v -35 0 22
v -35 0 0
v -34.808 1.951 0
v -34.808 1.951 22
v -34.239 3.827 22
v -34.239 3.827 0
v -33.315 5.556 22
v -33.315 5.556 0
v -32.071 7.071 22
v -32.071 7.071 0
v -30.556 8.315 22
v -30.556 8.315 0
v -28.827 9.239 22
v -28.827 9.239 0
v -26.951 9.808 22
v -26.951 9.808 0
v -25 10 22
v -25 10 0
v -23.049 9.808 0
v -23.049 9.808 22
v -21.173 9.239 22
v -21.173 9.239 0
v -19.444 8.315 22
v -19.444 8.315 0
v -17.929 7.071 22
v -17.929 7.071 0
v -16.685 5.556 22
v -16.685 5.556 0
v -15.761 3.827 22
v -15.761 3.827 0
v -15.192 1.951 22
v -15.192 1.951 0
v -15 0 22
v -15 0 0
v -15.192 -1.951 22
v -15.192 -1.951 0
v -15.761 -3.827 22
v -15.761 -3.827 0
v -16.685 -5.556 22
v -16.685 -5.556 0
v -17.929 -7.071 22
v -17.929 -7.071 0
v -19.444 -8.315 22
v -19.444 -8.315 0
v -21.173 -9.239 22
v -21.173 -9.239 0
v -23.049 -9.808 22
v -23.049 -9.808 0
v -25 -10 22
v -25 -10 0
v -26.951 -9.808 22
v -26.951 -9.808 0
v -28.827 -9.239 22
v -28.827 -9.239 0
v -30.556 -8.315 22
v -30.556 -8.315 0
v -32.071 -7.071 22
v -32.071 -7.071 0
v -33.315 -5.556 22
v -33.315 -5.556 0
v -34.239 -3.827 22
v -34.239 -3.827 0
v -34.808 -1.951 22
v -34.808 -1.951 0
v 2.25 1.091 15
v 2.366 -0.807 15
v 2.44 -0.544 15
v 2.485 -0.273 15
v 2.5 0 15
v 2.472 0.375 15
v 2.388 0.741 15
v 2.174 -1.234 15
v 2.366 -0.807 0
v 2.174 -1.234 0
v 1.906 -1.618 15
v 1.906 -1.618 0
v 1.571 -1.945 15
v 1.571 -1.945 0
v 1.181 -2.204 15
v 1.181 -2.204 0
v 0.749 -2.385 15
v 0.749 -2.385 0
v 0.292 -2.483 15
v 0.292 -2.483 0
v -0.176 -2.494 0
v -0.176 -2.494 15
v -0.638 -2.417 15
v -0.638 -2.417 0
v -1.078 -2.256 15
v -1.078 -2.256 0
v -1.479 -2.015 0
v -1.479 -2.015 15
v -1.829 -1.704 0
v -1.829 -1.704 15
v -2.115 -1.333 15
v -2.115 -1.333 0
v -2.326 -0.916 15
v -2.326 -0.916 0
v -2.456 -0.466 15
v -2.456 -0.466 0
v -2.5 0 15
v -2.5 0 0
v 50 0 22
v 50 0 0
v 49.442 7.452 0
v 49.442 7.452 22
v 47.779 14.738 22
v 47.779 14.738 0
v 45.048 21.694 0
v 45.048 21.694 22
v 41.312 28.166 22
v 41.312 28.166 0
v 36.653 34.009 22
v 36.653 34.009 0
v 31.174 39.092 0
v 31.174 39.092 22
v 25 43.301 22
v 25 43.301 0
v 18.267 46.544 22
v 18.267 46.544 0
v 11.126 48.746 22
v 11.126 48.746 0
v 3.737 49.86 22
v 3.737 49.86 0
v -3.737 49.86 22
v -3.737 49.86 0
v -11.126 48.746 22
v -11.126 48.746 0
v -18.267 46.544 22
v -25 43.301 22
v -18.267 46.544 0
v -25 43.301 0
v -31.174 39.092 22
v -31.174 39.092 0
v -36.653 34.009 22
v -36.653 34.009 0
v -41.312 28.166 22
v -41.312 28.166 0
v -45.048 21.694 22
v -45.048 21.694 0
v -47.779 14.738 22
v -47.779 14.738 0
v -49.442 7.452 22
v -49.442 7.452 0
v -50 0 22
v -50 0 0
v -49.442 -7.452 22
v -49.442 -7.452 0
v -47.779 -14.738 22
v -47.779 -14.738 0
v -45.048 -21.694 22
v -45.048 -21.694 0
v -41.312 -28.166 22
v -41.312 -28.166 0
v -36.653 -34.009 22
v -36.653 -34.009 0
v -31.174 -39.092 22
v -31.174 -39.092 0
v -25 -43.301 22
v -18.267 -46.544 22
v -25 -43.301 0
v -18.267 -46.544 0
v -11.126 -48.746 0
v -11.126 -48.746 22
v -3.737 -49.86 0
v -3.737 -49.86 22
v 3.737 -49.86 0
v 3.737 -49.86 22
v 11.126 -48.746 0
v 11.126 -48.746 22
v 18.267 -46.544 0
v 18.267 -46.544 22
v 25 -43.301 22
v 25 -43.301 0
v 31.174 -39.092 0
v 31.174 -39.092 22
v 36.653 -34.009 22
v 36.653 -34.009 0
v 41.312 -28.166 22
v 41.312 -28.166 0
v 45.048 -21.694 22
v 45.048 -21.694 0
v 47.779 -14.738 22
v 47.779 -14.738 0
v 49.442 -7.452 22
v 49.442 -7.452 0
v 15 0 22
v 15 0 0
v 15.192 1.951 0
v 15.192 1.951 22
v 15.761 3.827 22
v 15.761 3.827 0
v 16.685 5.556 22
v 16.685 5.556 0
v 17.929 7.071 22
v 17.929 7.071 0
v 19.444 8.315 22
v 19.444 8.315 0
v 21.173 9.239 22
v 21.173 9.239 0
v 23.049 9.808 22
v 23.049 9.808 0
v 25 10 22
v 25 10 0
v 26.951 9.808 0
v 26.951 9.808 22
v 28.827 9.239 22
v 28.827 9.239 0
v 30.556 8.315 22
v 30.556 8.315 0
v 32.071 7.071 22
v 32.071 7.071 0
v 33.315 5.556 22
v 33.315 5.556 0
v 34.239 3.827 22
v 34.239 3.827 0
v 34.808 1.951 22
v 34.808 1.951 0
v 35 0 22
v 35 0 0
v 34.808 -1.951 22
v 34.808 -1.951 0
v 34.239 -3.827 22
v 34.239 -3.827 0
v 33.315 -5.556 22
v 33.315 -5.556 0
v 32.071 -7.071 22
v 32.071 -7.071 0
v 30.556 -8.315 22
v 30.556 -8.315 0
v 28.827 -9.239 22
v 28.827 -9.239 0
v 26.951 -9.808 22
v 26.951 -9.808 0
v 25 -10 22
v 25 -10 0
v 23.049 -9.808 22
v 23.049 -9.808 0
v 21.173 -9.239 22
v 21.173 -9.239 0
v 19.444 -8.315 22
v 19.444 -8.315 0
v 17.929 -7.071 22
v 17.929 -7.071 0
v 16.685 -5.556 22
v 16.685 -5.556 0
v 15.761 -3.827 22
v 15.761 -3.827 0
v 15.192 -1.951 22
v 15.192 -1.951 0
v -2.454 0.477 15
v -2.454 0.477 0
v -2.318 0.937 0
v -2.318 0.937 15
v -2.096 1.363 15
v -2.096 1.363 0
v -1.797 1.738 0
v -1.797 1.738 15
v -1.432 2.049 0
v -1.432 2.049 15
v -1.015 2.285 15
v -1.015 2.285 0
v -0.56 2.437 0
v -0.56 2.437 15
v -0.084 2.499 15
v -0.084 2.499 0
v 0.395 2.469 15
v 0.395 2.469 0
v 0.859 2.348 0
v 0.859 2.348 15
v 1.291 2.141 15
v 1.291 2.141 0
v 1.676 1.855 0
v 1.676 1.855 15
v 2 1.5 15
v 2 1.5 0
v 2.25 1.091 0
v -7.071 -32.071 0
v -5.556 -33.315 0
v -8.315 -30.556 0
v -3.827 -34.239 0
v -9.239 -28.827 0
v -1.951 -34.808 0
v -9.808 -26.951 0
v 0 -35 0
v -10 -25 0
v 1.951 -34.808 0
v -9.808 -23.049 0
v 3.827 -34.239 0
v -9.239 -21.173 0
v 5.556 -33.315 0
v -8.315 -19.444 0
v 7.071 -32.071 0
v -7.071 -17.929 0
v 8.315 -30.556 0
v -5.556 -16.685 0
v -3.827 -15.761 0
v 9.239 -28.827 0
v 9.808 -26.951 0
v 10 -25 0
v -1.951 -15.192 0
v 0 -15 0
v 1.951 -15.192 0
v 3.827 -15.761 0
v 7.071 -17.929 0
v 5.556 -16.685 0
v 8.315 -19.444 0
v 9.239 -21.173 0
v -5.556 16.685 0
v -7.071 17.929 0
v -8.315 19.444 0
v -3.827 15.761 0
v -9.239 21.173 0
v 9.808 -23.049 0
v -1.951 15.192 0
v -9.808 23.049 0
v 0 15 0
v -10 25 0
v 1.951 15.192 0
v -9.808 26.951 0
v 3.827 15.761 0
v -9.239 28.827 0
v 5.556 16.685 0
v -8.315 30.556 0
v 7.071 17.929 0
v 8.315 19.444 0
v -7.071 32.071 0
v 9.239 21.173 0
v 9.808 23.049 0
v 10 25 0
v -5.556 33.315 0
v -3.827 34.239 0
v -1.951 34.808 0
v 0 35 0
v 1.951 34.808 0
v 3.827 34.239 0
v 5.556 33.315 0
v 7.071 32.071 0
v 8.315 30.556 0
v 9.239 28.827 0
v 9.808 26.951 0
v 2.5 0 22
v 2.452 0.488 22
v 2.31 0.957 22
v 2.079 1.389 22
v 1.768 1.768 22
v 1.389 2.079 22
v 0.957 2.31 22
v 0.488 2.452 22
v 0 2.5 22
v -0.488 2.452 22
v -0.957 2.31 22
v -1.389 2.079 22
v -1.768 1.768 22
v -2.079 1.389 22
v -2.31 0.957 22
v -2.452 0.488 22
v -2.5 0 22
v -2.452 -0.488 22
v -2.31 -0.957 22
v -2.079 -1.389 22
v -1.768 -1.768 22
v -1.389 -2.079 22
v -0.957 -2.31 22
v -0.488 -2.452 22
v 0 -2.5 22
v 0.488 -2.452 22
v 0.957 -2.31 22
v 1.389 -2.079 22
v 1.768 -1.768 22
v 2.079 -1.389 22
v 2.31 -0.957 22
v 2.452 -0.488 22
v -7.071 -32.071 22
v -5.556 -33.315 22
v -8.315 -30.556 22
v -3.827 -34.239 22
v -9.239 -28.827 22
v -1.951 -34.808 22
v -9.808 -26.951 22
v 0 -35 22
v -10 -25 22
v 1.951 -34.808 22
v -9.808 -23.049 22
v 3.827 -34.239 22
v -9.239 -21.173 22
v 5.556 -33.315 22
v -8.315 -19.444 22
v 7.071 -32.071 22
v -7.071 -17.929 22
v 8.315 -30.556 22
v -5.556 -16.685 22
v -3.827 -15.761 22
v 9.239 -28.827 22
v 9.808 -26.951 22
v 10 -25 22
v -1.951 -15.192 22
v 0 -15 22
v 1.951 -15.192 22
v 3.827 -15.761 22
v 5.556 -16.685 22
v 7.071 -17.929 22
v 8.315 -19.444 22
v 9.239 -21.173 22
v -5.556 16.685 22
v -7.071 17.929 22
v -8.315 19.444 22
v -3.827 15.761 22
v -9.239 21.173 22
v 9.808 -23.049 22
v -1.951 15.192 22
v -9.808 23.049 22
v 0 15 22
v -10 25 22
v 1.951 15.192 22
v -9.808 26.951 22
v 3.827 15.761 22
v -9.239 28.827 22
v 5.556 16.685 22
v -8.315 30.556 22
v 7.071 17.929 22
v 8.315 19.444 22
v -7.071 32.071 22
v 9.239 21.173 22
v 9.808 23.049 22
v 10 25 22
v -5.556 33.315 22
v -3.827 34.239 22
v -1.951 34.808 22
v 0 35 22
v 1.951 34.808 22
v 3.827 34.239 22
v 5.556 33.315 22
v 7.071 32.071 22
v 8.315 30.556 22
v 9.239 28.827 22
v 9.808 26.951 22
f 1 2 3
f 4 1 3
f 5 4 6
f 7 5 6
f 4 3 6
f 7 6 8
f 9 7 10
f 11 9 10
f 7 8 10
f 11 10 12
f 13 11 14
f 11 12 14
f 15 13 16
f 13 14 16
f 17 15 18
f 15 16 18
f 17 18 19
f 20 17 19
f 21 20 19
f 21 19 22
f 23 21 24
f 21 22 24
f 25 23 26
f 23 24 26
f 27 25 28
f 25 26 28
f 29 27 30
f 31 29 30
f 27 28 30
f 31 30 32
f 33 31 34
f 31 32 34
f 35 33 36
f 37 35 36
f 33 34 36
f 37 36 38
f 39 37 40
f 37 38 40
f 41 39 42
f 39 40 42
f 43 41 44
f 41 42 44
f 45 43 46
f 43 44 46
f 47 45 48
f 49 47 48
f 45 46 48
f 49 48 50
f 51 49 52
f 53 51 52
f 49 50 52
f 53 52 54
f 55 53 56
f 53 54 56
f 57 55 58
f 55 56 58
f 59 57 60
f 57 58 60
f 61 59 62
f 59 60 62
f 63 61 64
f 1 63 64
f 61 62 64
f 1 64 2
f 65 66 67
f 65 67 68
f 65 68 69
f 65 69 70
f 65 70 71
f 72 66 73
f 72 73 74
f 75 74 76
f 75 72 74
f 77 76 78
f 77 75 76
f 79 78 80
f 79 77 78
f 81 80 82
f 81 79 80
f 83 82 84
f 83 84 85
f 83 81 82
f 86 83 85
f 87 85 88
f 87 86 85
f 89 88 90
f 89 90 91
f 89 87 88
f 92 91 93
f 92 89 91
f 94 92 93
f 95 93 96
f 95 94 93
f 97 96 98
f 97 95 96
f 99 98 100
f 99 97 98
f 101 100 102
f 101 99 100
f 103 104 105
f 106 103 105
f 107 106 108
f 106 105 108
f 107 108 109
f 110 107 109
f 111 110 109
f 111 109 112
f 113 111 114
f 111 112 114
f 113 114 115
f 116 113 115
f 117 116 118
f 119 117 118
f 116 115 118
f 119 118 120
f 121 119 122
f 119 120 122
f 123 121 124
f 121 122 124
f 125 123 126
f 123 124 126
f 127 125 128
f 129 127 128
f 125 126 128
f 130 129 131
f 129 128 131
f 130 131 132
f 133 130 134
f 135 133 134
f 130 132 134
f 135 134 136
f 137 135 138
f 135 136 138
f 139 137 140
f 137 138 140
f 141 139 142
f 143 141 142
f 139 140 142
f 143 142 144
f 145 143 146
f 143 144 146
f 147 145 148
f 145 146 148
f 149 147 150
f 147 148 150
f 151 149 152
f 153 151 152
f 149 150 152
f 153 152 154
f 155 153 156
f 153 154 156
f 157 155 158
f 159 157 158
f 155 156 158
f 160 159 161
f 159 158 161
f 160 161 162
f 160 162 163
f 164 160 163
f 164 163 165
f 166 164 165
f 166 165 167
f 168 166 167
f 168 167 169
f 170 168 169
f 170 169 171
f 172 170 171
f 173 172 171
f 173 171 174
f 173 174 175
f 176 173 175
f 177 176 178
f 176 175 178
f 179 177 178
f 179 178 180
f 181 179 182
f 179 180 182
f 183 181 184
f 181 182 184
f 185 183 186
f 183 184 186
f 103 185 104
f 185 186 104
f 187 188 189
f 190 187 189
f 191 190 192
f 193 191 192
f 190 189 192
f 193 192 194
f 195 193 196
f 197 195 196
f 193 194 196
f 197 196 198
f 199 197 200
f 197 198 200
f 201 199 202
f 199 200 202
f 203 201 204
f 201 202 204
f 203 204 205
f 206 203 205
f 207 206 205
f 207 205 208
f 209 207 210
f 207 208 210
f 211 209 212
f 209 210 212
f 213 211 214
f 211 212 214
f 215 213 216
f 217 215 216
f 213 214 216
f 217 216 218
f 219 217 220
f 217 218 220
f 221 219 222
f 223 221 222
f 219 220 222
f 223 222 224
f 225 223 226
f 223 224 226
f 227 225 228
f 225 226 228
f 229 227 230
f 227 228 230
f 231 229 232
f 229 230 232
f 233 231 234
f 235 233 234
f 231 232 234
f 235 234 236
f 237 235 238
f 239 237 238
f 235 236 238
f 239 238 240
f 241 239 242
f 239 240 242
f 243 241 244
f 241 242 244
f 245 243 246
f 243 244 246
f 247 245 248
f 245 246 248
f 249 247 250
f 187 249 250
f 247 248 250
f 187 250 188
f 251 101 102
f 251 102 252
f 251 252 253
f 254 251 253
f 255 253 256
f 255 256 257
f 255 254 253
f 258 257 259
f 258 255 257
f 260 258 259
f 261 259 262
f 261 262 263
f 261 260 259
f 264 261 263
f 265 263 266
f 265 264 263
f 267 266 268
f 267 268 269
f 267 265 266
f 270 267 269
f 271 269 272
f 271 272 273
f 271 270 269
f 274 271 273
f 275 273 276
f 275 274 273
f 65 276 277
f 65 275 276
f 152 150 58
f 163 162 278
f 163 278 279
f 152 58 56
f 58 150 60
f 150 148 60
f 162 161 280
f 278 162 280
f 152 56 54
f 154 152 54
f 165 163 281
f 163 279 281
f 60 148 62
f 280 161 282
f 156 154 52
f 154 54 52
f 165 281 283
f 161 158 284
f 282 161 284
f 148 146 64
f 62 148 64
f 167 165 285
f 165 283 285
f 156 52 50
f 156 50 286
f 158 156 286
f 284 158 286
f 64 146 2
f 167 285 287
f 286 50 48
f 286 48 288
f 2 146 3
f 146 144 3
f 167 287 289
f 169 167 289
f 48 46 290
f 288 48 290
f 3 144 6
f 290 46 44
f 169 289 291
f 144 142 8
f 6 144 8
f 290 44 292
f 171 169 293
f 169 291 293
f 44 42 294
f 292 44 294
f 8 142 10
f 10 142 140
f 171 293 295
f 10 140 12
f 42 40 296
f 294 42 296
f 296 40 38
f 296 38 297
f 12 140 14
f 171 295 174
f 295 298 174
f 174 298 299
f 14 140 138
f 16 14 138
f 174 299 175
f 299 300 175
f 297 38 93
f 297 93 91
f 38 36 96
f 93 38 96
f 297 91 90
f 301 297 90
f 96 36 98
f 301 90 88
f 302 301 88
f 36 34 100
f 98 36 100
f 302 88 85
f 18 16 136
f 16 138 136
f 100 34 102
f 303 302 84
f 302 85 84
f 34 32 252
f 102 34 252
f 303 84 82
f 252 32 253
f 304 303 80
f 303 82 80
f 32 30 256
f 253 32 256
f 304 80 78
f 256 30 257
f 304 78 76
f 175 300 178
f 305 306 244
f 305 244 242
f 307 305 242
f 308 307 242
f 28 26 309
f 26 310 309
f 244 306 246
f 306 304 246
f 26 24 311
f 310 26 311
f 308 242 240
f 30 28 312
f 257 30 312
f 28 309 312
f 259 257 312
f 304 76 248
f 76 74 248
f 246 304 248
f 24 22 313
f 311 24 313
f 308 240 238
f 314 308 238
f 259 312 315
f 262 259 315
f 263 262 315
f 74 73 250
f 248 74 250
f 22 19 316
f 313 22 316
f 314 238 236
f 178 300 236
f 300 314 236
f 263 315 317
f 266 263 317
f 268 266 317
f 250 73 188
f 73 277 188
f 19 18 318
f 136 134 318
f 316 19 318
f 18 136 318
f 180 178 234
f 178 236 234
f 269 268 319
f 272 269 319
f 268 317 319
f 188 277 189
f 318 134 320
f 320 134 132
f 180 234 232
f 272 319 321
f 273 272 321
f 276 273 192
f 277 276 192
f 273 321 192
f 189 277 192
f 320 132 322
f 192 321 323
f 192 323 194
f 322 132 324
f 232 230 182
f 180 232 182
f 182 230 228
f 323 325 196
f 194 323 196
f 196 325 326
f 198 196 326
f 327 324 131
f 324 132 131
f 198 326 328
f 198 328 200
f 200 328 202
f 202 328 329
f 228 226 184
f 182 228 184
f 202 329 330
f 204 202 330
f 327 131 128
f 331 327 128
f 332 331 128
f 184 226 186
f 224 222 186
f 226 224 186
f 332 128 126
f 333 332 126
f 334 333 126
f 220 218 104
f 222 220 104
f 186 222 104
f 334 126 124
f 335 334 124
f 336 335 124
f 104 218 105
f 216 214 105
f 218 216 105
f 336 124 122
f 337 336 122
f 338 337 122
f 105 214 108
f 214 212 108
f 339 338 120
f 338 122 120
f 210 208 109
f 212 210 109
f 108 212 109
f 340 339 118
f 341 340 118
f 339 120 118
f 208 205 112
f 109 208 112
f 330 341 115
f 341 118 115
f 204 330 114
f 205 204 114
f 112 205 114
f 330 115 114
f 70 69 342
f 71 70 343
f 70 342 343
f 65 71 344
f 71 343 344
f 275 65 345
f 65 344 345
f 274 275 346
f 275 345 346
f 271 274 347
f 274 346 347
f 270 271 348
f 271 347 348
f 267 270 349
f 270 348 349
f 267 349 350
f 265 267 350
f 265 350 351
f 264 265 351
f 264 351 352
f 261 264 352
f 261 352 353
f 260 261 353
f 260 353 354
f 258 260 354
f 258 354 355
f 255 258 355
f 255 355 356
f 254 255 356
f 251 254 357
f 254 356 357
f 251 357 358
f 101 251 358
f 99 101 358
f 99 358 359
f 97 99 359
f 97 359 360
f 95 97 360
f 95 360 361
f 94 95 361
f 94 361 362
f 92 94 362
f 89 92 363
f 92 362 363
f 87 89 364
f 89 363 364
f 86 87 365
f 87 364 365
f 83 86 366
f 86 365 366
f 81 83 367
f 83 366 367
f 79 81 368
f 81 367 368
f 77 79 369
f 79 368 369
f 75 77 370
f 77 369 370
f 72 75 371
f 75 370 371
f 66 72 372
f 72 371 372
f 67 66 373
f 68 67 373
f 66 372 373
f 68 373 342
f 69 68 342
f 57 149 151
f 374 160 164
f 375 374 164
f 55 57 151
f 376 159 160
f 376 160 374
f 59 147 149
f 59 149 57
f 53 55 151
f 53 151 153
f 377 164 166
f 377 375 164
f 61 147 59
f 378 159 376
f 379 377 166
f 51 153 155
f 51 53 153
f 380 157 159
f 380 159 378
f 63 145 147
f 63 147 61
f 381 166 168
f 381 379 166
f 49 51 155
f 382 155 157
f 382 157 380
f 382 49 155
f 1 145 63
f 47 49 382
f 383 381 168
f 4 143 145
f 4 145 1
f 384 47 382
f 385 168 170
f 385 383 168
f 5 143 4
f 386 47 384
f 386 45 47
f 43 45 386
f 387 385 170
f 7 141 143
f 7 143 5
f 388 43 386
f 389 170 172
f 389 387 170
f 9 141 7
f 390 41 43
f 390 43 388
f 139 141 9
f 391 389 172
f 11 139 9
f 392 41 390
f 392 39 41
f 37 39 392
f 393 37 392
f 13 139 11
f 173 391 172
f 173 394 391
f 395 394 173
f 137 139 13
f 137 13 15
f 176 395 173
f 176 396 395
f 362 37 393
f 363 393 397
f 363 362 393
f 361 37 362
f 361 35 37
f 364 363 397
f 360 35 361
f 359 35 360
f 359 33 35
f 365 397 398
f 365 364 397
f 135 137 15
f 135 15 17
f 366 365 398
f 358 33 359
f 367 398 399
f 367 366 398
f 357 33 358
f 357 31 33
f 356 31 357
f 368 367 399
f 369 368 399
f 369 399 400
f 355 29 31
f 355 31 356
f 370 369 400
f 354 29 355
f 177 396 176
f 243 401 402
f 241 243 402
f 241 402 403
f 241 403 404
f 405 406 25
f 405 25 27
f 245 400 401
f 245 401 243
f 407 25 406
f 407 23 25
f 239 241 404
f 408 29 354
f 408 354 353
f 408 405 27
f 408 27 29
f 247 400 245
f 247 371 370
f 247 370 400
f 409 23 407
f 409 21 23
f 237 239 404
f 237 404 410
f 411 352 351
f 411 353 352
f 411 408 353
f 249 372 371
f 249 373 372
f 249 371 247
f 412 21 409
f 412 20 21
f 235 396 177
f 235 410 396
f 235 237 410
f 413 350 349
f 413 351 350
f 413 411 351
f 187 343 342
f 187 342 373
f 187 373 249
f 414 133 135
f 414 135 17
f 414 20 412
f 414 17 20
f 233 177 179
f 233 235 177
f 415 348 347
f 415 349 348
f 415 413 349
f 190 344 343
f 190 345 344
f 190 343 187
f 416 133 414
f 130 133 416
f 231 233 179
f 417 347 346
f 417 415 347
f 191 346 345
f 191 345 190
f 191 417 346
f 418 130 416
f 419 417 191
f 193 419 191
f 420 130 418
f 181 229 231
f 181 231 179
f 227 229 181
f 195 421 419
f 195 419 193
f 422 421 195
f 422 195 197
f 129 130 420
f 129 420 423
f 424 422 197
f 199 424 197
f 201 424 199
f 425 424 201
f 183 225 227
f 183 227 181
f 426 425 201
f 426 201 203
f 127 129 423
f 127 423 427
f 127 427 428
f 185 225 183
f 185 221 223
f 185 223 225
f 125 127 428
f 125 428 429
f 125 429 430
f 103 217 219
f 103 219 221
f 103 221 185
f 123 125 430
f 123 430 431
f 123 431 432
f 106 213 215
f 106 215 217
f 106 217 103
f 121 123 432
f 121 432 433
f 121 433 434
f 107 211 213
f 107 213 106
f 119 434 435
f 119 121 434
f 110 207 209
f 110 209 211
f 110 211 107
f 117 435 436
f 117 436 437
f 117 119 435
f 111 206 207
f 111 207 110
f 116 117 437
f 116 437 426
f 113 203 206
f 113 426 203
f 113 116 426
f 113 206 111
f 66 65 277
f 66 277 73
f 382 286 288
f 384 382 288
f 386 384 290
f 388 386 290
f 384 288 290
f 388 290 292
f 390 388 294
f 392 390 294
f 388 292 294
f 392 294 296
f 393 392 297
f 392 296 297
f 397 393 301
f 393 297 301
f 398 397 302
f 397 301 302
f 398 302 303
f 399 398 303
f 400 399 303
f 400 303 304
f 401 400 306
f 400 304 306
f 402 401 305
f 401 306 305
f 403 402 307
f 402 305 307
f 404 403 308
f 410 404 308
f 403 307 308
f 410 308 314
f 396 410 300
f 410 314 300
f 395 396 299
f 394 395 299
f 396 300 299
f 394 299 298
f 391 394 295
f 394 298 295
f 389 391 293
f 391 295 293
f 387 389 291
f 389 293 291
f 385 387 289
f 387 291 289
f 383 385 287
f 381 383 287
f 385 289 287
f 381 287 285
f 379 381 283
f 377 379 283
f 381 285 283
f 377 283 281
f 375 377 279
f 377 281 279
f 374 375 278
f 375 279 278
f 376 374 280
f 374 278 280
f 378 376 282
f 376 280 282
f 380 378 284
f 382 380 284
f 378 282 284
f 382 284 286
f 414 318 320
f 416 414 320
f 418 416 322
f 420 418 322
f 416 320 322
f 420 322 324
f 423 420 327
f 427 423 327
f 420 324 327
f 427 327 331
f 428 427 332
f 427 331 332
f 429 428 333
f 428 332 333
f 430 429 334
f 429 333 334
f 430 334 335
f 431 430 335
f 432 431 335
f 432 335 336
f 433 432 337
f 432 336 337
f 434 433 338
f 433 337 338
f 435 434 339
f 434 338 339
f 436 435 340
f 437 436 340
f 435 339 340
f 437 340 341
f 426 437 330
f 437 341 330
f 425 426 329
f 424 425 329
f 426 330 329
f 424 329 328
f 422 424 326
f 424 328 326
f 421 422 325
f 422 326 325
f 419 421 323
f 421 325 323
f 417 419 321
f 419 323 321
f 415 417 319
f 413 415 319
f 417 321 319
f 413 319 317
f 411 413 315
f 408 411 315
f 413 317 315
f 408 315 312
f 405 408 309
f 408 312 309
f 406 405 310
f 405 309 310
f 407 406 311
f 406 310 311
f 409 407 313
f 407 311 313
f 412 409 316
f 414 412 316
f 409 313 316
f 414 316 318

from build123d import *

# Parameters (mm, degrees)
ESQUISSE1_R             = 50
BOSS_EXTRU_1_DEPTH      = 22
ESQUISSE2_R             = 2.5
ENL_V_MAT_EXTRU_1_DEPTH = 7
ENL_V_START             = -15
ENL_V_MAT_EXTRU_3_DEPTH = 15
ESQUISSE4_R             = 10
ENL_V_MAT_EXTRU_5_DEPTH = 22
ESQUISSE5_R             = 10
ENL_V_MAT_EXTRU_6_DEPTH = 22
ESQUISSE6_R             = 10
ENL_V_MAT_EXTRU_7_DEPTH = 22
ESQUISSE7_R             = 10
ENL_V_MAT_EXTRU_8_DEPTH = 22


with BuildPart() as part:
    # Esquisse1 → Boss.-Extru.1 (new body)
    with BuildSketch(Plane.XY):
        Circle(ESQUISSE1_R)
    extrude(amount=BOSS_EXTRU_1_DEPTH)

    # Esquisse2 → Enlèv. mat.-Extru.1 (cut)
    with BuildSketch(Plane.XY.offset(22)):
        Circle(ESQUISSE2_R)
    extrude(amount=-ENL_V_MAT_EXTRU_1_DEPTH, mode=Mode.SUBTRACT)

    # Esquisse3 → Enlèv. mat.-Extru.3 (cut)
    with BuildSketch(Plane(origin=(0, 0, 0), x_dir=(-1, 0, 0), z_dir=(0, 0, -1)).offset(ENL_V_START)):
        with BuildLine():
            ThreePointArc((2.5, 0), (0.559569372, 2.436571796), (-2.249505694, 1.09074476))
            Line((-2.249505694, 1.09074476), (-2.366104086, -0.807187373))
            ThreePointArc((-2.366104086, -0.807187373), (0.409108657, -2.466298868), (2.5, 0))
        make_face()
    extrude(amount=ENL_V_MAT_EXTRU_3_DEPTH, mode=Mode.SUBTRACT)

    # Esquisse4 → Enlèv. mat.-Extru.5 (cut)
    with BuildSketch(Plane(origin=(0, 0, 0), x_dir=(-1, 0, 0), z_dir=(0, 0, -1))):
        with Locations((0, 25)):
            Circle(ESQUISSE4_R)
    extrude(amount=-ENL_V_MAT_EXTRU_5_DEPTH, mode=Mode.SUBTRACT)

    # Esquisse5 → Enlèv. mat.-Extru.6 (cut)
    with BuildSketch(Plane(origin=(0, 0, 0), x_dir=(-1, 0, 0), z_dir=(0, 0, -1))):
        with Locations((25, 0)):
            Circle(ESQUISSE5_R)
    extrude(amount=-ENL_V_MAT_EXTRU_6_DEPTH, mode=Mode.SUBTRACT)

    # Esquisse6 → Enlèv. mat.-Extru.7 (cut)
    with BuildSketch(Plane(origin=(0, 0, 0), x_dir=(-1, 0, 0), z_dir=(0, 0, -1))):
        with Locations((0, -25)):
            Circle(ESQUISSE6_R)
    extrude(amount=-ENL_V_MAT_EXTRU_7_DEPTH, mode=Mode.SUBTRACT)

    # Esquisse7 → Enlèv. mat.-Extru.8 (cut)
    with BuildSketch(Plane(origin=(0, 0, 0), x_dir=(-1, 0, 0), z_dir=(0, 0, -1))):
        with Locations((-25, 0)):
            Circle(ESQUISSE7_R)
    extrude(amount=-ENL_V_MAT_EXTRU_8_DEPTH, mode=Mode.SUBTRACT)


solid = part.part
